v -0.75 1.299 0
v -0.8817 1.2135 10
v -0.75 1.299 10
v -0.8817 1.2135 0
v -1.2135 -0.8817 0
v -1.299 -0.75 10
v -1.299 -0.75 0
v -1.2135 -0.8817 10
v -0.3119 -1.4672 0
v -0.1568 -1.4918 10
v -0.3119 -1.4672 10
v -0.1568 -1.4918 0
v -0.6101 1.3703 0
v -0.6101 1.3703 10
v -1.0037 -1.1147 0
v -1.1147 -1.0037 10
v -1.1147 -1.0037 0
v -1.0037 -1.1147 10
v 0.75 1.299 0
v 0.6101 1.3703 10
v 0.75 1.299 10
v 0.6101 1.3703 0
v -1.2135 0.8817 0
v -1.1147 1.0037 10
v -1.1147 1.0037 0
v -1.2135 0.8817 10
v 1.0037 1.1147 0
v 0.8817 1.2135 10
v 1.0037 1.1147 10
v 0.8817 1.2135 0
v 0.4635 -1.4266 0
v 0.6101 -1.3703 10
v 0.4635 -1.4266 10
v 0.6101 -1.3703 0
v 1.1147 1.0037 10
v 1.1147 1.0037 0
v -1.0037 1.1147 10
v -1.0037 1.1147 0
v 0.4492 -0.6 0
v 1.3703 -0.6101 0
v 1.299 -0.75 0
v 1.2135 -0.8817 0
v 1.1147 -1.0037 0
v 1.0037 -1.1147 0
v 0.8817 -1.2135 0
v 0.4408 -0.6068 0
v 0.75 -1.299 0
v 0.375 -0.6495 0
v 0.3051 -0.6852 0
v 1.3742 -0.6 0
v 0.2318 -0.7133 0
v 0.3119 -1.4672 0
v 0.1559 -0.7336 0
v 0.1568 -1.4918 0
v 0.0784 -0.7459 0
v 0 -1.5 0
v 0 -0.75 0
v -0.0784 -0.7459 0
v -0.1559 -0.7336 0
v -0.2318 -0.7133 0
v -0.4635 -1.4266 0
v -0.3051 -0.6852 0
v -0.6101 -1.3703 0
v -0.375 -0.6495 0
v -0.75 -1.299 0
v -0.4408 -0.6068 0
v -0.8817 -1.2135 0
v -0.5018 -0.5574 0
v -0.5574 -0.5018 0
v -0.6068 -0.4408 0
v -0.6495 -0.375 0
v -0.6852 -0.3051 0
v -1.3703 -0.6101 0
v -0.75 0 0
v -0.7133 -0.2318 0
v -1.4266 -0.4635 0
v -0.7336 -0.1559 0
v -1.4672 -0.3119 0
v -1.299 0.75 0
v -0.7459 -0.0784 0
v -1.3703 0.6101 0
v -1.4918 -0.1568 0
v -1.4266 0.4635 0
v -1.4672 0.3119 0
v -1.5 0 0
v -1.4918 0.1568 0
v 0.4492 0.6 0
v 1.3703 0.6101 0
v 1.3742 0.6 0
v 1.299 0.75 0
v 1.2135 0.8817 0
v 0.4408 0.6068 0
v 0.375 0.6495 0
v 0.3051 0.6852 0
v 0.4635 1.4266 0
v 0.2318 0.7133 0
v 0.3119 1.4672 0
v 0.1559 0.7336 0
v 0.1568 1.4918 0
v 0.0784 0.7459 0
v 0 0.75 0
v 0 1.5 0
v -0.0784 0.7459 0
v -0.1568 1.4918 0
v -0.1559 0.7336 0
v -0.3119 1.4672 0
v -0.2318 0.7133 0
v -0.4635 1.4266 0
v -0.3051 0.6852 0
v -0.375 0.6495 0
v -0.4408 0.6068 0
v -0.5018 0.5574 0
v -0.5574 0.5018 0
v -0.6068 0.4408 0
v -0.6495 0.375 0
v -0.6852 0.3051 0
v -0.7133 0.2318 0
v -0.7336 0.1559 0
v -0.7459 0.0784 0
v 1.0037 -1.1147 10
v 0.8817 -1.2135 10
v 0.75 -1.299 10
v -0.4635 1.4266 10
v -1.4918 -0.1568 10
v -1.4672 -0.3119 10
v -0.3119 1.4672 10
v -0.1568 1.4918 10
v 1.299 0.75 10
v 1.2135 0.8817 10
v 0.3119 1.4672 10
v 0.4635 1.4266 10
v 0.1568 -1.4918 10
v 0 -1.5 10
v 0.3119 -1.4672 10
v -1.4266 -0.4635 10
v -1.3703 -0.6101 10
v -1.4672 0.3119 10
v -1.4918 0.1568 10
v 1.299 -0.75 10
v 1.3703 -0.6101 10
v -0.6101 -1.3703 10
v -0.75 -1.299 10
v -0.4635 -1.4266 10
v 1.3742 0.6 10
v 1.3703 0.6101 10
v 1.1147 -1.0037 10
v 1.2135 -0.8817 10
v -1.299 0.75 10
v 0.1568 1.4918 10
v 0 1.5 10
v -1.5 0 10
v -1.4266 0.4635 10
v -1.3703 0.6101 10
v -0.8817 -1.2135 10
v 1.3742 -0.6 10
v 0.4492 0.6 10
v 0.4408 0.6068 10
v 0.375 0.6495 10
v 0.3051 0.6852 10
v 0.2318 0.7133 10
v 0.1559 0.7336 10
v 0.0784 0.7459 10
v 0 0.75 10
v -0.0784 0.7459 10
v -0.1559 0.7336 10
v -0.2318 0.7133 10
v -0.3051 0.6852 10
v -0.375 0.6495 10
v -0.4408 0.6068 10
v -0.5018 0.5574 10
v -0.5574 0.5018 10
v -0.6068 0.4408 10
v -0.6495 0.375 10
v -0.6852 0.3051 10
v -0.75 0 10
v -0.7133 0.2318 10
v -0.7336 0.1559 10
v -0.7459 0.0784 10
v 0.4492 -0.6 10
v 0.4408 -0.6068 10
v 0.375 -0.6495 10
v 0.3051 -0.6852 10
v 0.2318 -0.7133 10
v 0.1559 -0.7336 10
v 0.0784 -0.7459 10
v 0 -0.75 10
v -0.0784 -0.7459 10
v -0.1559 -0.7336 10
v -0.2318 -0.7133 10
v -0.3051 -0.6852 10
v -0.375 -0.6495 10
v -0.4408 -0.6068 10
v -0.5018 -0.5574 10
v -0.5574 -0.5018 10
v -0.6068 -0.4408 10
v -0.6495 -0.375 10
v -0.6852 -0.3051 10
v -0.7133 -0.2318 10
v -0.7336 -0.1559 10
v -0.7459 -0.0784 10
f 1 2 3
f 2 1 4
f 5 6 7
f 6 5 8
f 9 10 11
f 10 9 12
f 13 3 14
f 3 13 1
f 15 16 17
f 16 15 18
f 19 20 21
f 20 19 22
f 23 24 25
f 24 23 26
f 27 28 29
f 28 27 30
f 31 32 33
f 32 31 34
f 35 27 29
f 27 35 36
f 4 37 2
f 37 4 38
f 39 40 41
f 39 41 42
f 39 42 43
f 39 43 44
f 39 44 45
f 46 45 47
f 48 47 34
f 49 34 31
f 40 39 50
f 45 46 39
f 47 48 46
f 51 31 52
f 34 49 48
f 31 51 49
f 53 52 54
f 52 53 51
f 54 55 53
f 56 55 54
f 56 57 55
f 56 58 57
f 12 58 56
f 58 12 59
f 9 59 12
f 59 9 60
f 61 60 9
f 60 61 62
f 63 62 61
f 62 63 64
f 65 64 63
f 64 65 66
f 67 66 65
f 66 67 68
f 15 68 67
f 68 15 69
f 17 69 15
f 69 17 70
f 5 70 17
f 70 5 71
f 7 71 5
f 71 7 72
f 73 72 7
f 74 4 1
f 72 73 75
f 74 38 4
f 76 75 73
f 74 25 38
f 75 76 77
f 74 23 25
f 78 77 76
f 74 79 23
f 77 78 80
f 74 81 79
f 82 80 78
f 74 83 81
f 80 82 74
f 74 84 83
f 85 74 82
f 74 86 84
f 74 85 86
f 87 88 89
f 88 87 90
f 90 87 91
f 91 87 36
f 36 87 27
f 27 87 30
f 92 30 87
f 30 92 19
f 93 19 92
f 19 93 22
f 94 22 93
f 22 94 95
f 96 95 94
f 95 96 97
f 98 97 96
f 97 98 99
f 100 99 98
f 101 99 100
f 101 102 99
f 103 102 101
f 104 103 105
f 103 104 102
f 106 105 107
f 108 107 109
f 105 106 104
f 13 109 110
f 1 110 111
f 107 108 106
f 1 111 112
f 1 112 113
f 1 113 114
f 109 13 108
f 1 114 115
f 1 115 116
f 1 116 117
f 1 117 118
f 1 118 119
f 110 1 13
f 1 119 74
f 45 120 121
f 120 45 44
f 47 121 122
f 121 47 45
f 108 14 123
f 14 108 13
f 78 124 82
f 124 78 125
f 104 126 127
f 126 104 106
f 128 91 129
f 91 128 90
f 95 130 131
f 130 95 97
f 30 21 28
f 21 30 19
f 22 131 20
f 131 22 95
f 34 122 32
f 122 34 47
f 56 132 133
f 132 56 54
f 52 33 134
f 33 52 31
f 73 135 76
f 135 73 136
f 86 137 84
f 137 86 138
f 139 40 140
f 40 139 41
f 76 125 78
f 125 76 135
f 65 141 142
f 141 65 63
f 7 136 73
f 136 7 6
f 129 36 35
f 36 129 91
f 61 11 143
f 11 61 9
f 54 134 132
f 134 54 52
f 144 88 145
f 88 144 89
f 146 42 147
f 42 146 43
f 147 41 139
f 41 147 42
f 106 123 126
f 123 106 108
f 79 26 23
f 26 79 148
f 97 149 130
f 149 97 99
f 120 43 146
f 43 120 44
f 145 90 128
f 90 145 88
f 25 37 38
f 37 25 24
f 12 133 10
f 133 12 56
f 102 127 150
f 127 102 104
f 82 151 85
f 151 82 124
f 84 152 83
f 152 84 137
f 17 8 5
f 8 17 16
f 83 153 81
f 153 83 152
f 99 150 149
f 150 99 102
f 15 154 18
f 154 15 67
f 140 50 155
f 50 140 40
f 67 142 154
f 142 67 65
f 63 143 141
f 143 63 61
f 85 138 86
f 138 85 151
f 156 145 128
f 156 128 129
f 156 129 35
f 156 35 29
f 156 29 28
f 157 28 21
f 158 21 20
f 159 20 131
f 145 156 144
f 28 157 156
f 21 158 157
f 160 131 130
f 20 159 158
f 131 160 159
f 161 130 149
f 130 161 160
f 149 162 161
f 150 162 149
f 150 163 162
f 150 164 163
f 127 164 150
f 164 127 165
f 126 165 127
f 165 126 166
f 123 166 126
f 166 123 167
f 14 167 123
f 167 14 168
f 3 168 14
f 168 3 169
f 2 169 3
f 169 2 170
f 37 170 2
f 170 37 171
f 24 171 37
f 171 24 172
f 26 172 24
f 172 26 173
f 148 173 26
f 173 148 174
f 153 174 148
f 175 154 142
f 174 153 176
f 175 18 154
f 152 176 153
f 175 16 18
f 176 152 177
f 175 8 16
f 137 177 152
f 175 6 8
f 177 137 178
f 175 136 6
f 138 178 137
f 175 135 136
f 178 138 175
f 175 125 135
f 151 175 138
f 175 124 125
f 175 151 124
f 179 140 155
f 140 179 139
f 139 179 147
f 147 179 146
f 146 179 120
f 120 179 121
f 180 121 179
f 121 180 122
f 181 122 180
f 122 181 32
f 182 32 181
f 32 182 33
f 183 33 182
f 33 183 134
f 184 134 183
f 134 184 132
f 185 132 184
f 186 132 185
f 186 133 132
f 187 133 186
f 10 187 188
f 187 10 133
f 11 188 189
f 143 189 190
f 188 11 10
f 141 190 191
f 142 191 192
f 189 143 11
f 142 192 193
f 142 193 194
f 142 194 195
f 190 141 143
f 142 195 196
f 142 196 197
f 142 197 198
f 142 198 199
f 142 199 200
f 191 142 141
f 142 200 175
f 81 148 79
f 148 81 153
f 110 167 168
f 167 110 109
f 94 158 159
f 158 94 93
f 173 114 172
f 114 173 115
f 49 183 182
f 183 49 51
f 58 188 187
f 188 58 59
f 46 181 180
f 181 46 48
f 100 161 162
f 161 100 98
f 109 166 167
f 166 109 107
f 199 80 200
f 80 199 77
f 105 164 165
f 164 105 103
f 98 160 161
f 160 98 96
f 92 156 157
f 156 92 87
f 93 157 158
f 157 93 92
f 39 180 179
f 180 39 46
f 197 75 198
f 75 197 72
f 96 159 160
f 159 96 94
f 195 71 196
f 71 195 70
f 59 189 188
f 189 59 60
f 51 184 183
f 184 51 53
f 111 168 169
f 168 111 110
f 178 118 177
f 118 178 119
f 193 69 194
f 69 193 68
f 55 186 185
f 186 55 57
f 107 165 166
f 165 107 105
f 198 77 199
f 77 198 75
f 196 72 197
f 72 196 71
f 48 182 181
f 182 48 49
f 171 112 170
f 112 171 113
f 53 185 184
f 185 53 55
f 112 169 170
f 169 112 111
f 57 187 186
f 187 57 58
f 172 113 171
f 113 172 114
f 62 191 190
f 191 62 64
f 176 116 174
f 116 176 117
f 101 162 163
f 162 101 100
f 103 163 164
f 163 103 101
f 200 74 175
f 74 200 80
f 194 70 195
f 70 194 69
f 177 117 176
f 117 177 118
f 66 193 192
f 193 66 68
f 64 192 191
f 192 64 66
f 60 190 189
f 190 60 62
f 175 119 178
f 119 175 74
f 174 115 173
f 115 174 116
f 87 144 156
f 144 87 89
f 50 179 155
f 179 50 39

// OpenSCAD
// Slotted spring pin sleeve.
$fn = 60;
eps = 0.02;
inner_d = 1.5;
outer_d = 3;
length = 10;
slot_w = 1.2;
difference() {
    cylinder(d = outer_d, h = length);
    translate([0, 0, -eps]) cylinder(d = inner_d, h = length + 2 * eps);
    translate([0, -slot_w / 2, -eps]) cube([outer_d / 2 + eps, slot_w, length + 2 * eps]);
}
